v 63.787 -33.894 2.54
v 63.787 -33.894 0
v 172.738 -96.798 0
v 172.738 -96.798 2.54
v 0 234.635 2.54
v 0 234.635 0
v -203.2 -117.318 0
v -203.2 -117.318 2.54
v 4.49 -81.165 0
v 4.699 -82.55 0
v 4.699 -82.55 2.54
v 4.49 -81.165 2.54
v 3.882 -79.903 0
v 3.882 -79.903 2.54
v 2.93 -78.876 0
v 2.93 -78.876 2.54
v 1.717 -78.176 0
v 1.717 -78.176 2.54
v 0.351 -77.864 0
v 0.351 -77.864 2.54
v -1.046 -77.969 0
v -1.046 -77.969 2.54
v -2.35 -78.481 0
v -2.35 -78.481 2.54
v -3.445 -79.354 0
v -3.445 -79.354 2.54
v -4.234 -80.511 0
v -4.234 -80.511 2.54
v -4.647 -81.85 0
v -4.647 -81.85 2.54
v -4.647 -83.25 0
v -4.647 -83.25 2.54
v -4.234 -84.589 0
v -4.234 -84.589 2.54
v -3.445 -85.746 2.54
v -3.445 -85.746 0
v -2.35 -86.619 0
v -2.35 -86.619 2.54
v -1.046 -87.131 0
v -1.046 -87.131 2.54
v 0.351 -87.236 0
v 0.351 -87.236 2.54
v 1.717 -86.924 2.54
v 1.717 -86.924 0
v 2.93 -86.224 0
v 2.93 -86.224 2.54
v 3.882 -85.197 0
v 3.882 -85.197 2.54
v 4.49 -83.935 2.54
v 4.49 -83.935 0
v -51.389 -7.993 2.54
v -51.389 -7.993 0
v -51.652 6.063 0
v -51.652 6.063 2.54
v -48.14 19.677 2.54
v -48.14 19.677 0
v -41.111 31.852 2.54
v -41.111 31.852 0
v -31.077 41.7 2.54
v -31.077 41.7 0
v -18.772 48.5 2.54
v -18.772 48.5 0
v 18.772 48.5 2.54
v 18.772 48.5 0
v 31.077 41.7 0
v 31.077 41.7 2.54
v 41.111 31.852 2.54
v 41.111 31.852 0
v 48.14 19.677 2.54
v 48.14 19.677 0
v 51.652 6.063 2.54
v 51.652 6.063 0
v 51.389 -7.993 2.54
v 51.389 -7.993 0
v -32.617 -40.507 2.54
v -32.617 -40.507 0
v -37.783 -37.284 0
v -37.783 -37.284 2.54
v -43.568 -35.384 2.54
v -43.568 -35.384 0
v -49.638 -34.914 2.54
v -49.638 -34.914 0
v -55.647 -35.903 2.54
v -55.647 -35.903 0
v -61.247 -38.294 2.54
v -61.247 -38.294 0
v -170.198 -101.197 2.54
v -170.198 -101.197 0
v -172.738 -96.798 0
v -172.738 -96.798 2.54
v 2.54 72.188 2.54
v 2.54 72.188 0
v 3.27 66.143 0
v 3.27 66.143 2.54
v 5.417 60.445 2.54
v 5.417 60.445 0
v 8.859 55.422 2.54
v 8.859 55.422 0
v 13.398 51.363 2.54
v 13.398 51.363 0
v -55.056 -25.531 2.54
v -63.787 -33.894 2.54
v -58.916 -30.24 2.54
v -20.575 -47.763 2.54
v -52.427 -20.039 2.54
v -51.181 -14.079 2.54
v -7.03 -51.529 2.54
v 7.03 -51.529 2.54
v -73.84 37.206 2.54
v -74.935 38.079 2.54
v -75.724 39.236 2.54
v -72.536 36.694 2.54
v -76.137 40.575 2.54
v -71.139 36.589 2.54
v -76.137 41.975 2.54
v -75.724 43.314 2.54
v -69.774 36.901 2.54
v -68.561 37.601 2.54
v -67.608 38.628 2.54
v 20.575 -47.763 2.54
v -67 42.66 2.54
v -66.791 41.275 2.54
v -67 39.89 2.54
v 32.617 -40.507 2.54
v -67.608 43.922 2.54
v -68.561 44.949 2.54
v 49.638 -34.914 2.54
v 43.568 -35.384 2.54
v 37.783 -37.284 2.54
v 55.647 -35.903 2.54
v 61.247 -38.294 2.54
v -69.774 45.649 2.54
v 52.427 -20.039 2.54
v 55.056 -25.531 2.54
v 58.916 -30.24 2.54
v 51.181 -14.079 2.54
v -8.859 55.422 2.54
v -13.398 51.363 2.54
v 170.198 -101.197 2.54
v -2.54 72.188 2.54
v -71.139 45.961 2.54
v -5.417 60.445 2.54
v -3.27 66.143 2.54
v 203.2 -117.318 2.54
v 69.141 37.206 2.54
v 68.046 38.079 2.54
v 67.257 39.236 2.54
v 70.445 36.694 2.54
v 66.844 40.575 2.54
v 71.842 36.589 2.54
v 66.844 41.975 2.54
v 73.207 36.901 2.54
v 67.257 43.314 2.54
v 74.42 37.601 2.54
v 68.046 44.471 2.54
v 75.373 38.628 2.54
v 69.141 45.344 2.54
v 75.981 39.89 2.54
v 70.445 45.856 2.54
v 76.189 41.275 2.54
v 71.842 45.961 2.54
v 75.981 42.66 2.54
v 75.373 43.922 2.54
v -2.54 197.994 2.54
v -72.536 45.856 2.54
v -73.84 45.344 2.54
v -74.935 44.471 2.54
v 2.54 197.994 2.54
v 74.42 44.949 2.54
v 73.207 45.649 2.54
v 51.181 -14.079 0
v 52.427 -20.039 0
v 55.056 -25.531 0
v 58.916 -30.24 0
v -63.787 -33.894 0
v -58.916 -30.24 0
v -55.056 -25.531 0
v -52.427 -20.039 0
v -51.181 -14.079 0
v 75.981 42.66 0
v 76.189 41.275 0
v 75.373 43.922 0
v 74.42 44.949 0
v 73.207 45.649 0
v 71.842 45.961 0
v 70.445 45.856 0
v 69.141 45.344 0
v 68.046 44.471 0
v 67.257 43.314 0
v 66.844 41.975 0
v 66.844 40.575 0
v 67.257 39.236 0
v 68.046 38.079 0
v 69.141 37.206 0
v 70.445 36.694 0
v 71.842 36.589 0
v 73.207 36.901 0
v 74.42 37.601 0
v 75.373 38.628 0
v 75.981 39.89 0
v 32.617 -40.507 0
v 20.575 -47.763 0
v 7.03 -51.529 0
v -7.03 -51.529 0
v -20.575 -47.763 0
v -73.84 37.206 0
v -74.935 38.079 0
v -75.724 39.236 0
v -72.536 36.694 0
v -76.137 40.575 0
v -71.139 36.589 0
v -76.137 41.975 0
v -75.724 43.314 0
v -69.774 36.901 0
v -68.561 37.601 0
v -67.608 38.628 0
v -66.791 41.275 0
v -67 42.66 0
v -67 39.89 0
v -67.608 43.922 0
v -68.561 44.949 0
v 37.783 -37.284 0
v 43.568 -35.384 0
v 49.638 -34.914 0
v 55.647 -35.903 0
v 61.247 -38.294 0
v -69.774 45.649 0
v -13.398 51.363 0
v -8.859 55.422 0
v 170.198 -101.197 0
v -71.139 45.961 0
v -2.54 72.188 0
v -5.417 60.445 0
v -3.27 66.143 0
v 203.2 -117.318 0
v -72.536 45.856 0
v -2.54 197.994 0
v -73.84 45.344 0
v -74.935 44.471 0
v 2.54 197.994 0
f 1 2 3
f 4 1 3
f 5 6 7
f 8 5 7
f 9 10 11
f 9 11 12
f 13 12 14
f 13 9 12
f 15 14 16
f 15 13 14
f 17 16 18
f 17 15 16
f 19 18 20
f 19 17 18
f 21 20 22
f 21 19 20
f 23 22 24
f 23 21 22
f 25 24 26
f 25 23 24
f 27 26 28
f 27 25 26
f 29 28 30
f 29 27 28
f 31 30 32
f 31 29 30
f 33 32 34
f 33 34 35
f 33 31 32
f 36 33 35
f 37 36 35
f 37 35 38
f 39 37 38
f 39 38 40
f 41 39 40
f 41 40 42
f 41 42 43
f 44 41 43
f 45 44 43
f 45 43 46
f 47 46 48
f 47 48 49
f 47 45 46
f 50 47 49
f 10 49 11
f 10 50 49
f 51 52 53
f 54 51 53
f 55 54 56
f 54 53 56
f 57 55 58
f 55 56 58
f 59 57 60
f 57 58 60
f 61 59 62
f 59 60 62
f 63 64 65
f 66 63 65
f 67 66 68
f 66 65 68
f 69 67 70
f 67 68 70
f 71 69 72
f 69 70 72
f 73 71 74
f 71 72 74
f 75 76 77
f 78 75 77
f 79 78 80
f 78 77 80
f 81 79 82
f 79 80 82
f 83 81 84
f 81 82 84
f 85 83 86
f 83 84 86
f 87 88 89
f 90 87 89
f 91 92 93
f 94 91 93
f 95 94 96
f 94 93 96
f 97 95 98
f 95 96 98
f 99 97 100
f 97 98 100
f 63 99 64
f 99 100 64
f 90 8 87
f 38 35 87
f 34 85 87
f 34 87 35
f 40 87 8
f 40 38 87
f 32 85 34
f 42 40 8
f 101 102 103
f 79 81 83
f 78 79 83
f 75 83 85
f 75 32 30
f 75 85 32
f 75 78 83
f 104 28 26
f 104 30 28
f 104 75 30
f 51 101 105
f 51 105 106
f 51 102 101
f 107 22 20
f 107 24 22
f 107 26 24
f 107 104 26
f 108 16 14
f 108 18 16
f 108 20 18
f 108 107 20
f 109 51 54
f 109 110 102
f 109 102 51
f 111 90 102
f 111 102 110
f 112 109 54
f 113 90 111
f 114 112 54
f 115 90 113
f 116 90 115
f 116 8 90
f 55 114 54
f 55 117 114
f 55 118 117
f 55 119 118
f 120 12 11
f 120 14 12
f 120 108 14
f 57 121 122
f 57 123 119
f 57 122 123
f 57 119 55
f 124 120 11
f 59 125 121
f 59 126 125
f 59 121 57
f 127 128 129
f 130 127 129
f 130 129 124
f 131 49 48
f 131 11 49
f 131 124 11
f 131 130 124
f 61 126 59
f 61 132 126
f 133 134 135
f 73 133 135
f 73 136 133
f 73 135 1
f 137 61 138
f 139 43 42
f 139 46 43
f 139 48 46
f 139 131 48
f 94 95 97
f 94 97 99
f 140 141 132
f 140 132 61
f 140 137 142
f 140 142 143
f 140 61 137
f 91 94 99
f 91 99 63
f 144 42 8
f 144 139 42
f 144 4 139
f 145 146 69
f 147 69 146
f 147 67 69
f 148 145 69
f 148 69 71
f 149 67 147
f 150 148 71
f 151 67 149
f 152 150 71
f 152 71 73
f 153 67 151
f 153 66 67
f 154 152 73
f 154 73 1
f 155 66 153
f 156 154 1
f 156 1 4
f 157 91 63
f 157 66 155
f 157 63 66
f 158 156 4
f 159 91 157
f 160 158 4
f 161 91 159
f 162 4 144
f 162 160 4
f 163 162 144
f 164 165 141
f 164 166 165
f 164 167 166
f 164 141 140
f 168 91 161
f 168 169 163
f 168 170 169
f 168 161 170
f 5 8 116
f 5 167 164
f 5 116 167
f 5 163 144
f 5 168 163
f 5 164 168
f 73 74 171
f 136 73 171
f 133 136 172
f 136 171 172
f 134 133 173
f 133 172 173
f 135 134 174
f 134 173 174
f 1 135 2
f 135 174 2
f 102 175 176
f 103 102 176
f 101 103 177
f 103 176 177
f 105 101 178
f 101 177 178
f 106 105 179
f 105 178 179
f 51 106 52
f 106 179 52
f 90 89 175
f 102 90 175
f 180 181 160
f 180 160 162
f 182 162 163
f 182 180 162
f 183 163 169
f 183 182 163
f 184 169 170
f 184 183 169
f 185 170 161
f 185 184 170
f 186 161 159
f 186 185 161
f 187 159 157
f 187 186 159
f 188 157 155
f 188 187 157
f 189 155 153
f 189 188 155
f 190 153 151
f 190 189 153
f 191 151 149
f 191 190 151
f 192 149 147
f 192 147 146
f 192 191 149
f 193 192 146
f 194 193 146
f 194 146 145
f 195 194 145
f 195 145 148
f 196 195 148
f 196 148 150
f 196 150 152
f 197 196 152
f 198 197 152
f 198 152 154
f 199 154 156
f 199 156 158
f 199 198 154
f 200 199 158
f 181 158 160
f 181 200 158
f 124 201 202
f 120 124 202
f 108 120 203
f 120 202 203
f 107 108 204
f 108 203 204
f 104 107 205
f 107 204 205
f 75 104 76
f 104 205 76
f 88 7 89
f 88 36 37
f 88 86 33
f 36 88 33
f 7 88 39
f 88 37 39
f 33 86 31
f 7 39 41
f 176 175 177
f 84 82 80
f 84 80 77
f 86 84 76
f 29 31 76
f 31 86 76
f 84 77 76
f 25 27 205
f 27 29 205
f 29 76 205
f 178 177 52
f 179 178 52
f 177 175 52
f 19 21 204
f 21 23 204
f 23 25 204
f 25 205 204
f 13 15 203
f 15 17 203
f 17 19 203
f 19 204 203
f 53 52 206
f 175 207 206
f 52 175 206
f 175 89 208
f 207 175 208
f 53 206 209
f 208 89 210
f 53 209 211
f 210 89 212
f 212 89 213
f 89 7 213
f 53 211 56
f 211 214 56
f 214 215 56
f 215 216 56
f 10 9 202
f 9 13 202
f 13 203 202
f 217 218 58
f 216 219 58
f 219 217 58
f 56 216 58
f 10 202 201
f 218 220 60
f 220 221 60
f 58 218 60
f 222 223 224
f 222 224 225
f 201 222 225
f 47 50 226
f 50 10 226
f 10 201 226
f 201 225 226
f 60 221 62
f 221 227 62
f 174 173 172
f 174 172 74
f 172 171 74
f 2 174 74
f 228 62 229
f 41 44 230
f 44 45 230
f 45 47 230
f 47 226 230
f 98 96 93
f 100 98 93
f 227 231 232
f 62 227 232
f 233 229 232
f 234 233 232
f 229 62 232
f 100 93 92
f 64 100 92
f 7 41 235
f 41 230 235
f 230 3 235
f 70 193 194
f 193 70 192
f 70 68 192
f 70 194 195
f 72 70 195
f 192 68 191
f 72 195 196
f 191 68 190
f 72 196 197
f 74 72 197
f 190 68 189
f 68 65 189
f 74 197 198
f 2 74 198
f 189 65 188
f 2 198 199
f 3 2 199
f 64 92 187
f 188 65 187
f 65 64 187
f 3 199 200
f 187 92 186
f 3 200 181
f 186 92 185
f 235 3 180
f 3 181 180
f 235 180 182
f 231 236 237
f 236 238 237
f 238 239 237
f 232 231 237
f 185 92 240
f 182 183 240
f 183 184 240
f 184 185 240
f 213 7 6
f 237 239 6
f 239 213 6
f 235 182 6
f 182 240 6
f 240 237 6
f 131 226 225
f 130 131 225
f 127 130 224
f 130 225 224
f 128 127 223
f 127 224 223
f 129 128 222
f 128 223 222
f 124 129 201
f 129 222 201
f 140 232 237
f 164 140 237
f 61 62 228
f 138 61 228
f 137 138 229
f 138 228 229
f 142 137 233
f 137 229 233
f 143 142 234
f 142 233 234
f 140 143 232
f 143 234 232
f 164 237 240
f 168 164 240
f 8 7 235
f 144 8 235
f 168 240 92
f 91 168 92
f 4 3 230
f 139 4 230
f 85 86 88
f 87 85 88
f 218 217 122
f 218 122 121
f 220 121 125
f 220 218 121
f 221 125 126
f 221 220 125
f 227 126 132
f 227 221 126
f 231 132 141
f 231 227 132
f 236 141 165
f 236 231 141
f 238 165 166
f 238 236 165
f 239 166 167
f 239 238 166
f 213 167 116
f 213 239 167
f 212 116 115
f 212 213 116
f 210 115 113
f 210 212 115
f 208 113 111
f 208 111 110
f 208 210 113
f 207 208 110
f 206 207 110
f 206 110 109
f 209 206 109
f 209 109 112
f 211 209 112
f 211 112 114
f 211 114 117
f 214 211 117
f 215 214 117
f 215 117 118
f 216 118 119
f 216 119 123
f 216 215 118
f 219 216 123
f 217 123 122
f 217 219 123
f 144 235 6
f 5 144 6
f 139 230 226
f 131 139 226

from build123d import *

# Parameters (mm, degrees)
SKETCH1_R           = 4.699
BOSS_EXTRUDE1_DEPTH = 2.54


with BuildPart() as part:
    # Sketch1 → Boss-Extrude1 (new body)
    with BuildSketch(Plane.XY):
        Polygon((0, 234.635149399), (-203.2, -117.317574699), (203.2, -117.317574699), align=None)
        with Locations((0, -82.55)):
            Circle(SKETCH1_R, mode=Mode.SUBTRACT)
        with Locations((-71.490397082, 41.275)):
            Circle(SKETCH1_R, mode=Mode.SUBTRACT)
        with Locations((71.490397082, 41.275)):
            Circle(SKETCH1_R, mode=Mode.SUBTRACT)
        with BuildLine():
            Line((-2.54, 72.188105961), (-2.54, 197.994436105))
            Line((-2.54, 197.994436105), (2.54, 197.994436105))
            Line((2.54, 197.994436105), (2.54, 72.188105961))
            ThreePointArc((2.54, 72.188105961), (6.987296904, 57.830382152), (18.771829368, 48.500458394))
            ThreePointArc((18.771829368, 48.500458394), (45.038950162, 26.00325), (51.388543748, -7.993348088))
            ThreePointArc((51.388543748, -7.993348088), (53.576228506, -22.864014453), (63.786733613, -33.894348455))
            Line((63.786733613, -33.894348455), (172.738211475, -96.797513527))
            Line((172.738211475, -96.797513527), (170.198211475, -101.196922578))
            Line((170.198211475, -101.196922578), (61.246733613, -38.293757506))
            ThreePointArc((61.246733613, -38.293757506), (46.588931602, -34.966367699), (32.61671438, -40.507110305))
            ThreePointArc((32.61671438, -40.507110305), (0, -52.0065), (-32.61671438, -40.507110305))
            ThreePointArc((-32.61671438, -40.507110305), (-46.588931602, -34.966367699), (-61.246733613, -38.293757506))
            Line((-61.246733613, -38.293757506), (-170.198211475, -101.196922578))
            Line((-170.198211475, -101.196922578), (-172.738211475, -96.797513527))
            Line((-172.738211475, -96.797513527), (-63.786733613, -33.894348455))
            ThreePointArc((-63.786733613, -33.894348455), (-53.576228506, -22.864014453), (-51.388543748, -7.993348088))
            ThreePointArc((-51.388543748, -7.993348088), (-45.038950162, 26.00325), (-18.771829368, 48.500458394))
            ThreePointArc((-18.771829368, 48.500458394), (-6.987296904, 57.830382152), (-2.54, 72.188105961))
        make_face(mode=Mode.SUBTRACT)
    extrude(amount=BOSS_EXTRUDE1_DEPTH)


solid = part.part
